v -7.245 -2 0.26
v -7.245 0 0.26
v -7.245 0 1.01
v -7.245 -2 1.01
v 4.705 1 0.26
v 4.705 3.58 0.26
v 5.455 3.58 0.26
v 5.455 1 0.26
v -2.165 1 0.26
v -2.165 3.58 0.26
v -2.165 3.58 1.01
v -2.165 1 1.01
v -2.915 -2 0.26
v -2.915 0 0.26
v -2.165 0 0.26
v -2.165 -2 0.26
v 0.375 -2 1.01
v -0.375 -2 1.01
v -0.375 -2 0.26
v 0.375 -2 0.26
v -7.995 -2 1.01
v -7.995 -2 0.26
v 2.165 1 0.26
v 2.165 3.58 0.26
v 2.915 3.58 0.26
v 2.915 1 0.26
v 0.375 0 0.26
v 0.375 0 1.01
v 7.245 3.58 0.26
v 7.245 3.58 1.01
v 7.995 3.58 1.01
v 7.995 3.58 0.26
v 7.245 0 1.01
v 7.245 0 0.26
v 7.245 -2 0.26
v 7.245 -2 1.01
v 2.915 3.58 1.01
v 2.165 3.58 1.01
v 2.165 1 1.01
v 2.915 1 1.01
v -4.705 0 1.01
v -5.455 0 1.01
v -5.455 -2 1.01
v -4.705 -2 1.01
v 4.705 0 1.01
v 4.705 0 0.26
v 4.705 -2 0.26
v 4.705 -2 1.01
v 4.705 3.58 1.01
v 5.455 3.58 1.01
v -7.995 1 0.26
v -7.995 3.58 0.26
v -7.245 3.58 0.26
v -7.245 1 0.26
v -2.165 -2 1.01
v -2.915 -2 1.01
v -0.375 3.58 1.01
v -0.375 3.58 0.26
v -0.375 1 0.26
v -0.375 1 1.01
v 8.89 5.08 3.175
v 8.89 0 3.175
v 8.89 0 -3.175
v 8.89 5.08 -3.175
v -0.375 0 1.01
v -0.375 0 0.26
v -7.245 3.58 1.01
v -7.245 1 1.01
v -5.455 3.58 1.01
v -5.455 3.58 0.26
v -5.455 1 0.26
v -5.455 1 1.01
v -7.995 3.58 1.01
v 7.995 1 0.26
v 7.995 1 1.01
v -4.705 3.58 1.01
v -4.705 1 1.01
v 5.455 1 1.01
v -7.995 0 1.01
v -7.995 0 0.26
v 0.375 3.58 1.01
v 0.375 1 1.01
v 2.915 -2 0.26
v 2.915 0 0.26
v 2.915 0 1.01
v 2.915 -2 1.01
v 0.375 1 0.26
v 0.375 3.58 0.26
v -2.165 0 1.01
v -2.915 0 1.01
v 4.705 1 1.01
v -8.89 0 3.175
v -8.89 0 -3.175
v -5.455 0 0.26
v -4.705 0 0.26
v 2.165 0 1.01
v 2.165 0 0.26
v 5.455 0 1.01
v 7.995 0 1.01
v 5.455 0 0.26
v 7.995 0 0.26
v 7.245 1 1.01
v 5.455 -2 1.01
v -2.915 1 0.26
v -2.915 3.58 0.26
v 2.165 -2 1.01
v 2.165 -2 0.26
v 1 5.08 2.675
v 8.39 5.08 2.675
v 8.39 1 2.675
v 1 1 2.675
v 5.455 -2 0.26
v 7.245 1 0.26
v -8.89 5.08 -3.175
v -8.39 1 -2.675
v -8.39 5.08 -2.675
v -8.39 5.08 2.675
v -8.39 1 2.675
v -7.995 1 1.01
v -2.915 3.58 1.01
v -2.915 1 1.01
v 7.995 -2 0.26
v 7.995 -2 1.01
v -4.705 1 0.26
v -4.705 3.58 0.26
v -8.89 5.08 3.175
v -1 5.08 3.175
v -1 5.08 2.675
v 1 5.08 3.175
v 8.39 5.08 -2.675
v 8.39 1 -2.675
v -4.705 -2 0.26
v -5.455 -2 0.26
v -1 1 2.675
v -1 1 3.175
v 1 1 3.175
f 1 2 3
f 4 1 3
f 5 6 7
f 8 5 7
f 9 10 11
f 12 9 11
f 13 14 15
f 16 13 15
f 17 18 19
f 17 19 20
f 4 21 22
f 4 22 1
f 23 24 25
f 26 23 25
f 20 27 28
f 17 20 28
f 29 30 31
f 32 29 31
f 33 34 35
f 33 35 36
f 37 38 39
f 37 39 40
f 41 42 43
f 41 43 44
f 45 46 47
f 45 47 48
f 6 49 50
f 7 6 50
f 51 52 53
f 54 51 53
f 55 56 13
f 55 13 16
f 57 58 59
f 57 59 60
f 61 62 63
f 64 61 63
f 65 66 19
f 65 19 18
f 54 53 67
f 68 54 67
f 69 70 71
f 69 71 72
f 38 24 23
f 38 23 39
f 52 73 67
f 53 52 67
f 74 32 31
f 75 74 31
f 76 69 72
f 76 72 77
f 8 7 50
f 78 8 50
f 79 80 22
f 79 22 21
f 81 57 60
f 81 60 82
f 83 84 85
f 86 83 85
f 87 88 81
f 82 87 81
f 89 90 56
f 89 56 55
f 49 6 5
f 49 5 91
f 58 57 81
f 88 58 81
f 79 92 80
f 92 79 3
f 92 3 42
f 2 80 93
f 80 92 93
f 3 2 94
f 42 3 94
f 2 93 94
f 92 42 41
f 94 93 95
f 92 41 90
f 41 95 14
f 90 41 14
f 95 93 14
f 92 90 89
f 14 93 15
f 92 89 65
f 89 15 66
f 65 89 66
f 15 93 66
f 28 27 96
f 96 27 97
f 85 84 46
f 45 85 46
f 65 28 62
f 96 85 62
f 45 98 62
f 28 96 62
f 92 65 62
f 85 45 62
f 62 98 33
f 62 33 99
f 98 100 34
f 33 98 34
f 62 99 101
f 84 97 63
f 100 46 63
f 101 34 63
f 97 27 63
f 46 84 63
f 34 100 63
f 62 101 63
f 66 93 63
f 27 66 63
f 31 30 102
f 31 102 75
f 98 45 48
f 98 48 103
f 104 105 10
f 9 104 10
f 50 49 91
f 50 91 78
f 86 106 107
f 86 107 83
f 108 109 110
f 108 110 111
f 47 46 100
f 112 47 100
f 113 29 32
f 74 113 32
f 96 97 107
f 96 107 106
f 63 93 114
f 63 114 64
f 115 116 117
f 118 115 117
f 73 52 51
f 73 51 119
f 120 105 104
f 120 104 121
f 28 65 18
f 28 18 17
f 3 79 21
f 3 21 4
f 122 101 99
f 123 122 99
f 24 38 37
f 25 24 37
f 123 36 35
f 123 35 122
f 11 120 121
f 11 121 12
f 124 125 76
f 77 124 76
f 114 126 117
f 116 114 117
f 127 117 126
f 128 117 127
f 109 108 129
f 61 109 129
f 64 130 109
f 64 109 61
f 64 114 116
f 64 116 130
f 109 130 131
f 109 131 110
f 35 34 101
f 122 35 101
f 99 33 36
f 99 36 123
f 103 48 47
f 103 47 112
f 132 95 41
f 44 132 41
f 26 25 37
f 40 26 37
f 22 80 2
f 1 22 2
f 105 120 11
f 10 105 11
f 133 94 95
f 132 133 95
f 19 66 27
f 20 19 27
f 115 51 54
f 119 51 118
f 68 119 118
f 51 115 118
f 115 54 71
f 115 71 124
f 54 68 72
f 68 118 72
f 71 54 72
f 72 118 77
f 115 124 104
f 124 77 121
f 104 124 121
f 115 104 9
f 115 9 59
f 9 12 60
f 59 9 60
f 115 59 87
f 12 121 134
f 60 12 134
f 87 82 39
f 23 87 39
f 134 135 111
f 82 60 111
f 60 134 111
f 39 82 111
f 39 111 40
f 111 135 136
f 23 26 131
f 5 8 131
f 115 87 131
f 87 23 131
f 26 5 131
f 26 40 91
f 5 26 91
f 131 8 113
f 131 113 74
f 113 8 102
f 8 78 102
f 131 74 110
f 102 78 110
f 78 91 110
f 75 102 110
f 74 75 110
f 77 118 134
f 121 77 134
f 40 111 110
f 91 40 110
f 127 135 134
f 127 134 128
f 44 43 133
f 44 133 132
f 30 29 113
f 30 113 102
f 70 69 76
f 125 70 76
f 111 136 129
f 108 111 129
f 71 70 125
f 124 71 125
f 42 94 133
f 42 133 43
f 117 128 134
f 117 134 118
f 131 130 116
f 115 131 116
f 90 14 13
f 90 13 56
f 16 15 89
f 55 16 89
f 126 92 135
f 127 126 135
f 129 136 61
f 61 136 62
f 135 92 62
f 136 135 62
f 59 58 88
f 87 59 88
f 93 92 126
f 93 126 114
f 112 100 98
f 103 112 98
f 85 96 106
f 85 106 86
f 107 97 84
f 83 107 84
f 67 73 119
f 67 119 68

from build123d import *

# Parameters (mm, degrees)
SKETCH_1_W           = 17.78
SKETCH_1_H           = 6.35
EXTRUDE_1_DEPTH      = 5.08
SKETCH_2_W           = 16.78
SKETCH_2_H           = 5.35
CUT_EXTRUDE_1_DEPTH  = 4.08
SKETCH_3_W           = 2
SKETCH_3_H           = 4.08
CUT_EXTRUDE_2_DEPTH  = 1
EXTRUDE_2_DEPTH      = 2
EXTRUDE_2_DEPTH_BACK = 3.58
SKETCH_4_W           = 0.75
SKETCH_4_H           = 0.75


with BuildPart() as part:
    # 草图1 → 拉伸1 (new body)
    with BuildSketch(Plane(origin=(0, 0, 0), x_dir=(1, 0, 0), z_dir=(0, 1, 0))):
        Rectangle(SKETCH_1_W, SKETCH_1_H)
    extrude(amount=EXTRUDE_1_DEPTH)

    # 草图2 → 切除-拉伸1 (cut)
    with BuildSketch(Plane(origin=(0, 5.08, 0), x_dir=(-1, 0, 0), z_dir=(0, 1, 0))):
        Rectangle(SKETCH_2_W, SKETCH_2_H)
    extrude(amount=-CUT_EXTRUDE_1_DEPTH, mode=Mode.SUBTRACT)

    # 草图3 → 切除-拉伸2 (cut)
    with BuildSketch(Plane.XY.offset(3.175)):
        with Locations((0, 3.04)):
            Rectangle(SKETCH_3_W, SKETCH_3_H)
    extrude(amount=-CUT_EXTRUDE_2_DEPTH, mode=Mode.SUBTRACT)

    # 草图4 → 拉伸2 (add, two sides: drawn at the far end of the back side and taken through both)
    with BuildSketch(Plane.XZ.offset(-EXTRUDE_2_DEPTH_BACK)):
        with Locations((5.08, 0.635)):
            Rectangle(SKETCH_4_W, SKETCH_4_H)
        with Locations((0, 0.635)):
            Rectangle(SKETCH_4_W, SKETCH_4_H)
        with Locations((2.54, 0.635)):
            Rectangle(SKETCH_4_W, SKETCH_4_H)
        with Locations((7.62, 0.635)):
            Rectangle(SKETCH_4_W, SKETCH_4_H)
        with Locations((-2.54, 0.635)):
            Rectangle(SKETCH_4_W, SKETCH_4_H)
        with Locations((-7.62, 0.635)):
            Rectangle(SKETCH_4_W, SKETCH_4_H)
        with Locations((-5.08, 0.635)):
            Rectangle(SKETCH_4_W, SKETCH_4_H)
    extrude(amount=EXTRUDE_2_DEPTH + EXTRUDE_2_DEPTH_BACK)


solid = part.part
